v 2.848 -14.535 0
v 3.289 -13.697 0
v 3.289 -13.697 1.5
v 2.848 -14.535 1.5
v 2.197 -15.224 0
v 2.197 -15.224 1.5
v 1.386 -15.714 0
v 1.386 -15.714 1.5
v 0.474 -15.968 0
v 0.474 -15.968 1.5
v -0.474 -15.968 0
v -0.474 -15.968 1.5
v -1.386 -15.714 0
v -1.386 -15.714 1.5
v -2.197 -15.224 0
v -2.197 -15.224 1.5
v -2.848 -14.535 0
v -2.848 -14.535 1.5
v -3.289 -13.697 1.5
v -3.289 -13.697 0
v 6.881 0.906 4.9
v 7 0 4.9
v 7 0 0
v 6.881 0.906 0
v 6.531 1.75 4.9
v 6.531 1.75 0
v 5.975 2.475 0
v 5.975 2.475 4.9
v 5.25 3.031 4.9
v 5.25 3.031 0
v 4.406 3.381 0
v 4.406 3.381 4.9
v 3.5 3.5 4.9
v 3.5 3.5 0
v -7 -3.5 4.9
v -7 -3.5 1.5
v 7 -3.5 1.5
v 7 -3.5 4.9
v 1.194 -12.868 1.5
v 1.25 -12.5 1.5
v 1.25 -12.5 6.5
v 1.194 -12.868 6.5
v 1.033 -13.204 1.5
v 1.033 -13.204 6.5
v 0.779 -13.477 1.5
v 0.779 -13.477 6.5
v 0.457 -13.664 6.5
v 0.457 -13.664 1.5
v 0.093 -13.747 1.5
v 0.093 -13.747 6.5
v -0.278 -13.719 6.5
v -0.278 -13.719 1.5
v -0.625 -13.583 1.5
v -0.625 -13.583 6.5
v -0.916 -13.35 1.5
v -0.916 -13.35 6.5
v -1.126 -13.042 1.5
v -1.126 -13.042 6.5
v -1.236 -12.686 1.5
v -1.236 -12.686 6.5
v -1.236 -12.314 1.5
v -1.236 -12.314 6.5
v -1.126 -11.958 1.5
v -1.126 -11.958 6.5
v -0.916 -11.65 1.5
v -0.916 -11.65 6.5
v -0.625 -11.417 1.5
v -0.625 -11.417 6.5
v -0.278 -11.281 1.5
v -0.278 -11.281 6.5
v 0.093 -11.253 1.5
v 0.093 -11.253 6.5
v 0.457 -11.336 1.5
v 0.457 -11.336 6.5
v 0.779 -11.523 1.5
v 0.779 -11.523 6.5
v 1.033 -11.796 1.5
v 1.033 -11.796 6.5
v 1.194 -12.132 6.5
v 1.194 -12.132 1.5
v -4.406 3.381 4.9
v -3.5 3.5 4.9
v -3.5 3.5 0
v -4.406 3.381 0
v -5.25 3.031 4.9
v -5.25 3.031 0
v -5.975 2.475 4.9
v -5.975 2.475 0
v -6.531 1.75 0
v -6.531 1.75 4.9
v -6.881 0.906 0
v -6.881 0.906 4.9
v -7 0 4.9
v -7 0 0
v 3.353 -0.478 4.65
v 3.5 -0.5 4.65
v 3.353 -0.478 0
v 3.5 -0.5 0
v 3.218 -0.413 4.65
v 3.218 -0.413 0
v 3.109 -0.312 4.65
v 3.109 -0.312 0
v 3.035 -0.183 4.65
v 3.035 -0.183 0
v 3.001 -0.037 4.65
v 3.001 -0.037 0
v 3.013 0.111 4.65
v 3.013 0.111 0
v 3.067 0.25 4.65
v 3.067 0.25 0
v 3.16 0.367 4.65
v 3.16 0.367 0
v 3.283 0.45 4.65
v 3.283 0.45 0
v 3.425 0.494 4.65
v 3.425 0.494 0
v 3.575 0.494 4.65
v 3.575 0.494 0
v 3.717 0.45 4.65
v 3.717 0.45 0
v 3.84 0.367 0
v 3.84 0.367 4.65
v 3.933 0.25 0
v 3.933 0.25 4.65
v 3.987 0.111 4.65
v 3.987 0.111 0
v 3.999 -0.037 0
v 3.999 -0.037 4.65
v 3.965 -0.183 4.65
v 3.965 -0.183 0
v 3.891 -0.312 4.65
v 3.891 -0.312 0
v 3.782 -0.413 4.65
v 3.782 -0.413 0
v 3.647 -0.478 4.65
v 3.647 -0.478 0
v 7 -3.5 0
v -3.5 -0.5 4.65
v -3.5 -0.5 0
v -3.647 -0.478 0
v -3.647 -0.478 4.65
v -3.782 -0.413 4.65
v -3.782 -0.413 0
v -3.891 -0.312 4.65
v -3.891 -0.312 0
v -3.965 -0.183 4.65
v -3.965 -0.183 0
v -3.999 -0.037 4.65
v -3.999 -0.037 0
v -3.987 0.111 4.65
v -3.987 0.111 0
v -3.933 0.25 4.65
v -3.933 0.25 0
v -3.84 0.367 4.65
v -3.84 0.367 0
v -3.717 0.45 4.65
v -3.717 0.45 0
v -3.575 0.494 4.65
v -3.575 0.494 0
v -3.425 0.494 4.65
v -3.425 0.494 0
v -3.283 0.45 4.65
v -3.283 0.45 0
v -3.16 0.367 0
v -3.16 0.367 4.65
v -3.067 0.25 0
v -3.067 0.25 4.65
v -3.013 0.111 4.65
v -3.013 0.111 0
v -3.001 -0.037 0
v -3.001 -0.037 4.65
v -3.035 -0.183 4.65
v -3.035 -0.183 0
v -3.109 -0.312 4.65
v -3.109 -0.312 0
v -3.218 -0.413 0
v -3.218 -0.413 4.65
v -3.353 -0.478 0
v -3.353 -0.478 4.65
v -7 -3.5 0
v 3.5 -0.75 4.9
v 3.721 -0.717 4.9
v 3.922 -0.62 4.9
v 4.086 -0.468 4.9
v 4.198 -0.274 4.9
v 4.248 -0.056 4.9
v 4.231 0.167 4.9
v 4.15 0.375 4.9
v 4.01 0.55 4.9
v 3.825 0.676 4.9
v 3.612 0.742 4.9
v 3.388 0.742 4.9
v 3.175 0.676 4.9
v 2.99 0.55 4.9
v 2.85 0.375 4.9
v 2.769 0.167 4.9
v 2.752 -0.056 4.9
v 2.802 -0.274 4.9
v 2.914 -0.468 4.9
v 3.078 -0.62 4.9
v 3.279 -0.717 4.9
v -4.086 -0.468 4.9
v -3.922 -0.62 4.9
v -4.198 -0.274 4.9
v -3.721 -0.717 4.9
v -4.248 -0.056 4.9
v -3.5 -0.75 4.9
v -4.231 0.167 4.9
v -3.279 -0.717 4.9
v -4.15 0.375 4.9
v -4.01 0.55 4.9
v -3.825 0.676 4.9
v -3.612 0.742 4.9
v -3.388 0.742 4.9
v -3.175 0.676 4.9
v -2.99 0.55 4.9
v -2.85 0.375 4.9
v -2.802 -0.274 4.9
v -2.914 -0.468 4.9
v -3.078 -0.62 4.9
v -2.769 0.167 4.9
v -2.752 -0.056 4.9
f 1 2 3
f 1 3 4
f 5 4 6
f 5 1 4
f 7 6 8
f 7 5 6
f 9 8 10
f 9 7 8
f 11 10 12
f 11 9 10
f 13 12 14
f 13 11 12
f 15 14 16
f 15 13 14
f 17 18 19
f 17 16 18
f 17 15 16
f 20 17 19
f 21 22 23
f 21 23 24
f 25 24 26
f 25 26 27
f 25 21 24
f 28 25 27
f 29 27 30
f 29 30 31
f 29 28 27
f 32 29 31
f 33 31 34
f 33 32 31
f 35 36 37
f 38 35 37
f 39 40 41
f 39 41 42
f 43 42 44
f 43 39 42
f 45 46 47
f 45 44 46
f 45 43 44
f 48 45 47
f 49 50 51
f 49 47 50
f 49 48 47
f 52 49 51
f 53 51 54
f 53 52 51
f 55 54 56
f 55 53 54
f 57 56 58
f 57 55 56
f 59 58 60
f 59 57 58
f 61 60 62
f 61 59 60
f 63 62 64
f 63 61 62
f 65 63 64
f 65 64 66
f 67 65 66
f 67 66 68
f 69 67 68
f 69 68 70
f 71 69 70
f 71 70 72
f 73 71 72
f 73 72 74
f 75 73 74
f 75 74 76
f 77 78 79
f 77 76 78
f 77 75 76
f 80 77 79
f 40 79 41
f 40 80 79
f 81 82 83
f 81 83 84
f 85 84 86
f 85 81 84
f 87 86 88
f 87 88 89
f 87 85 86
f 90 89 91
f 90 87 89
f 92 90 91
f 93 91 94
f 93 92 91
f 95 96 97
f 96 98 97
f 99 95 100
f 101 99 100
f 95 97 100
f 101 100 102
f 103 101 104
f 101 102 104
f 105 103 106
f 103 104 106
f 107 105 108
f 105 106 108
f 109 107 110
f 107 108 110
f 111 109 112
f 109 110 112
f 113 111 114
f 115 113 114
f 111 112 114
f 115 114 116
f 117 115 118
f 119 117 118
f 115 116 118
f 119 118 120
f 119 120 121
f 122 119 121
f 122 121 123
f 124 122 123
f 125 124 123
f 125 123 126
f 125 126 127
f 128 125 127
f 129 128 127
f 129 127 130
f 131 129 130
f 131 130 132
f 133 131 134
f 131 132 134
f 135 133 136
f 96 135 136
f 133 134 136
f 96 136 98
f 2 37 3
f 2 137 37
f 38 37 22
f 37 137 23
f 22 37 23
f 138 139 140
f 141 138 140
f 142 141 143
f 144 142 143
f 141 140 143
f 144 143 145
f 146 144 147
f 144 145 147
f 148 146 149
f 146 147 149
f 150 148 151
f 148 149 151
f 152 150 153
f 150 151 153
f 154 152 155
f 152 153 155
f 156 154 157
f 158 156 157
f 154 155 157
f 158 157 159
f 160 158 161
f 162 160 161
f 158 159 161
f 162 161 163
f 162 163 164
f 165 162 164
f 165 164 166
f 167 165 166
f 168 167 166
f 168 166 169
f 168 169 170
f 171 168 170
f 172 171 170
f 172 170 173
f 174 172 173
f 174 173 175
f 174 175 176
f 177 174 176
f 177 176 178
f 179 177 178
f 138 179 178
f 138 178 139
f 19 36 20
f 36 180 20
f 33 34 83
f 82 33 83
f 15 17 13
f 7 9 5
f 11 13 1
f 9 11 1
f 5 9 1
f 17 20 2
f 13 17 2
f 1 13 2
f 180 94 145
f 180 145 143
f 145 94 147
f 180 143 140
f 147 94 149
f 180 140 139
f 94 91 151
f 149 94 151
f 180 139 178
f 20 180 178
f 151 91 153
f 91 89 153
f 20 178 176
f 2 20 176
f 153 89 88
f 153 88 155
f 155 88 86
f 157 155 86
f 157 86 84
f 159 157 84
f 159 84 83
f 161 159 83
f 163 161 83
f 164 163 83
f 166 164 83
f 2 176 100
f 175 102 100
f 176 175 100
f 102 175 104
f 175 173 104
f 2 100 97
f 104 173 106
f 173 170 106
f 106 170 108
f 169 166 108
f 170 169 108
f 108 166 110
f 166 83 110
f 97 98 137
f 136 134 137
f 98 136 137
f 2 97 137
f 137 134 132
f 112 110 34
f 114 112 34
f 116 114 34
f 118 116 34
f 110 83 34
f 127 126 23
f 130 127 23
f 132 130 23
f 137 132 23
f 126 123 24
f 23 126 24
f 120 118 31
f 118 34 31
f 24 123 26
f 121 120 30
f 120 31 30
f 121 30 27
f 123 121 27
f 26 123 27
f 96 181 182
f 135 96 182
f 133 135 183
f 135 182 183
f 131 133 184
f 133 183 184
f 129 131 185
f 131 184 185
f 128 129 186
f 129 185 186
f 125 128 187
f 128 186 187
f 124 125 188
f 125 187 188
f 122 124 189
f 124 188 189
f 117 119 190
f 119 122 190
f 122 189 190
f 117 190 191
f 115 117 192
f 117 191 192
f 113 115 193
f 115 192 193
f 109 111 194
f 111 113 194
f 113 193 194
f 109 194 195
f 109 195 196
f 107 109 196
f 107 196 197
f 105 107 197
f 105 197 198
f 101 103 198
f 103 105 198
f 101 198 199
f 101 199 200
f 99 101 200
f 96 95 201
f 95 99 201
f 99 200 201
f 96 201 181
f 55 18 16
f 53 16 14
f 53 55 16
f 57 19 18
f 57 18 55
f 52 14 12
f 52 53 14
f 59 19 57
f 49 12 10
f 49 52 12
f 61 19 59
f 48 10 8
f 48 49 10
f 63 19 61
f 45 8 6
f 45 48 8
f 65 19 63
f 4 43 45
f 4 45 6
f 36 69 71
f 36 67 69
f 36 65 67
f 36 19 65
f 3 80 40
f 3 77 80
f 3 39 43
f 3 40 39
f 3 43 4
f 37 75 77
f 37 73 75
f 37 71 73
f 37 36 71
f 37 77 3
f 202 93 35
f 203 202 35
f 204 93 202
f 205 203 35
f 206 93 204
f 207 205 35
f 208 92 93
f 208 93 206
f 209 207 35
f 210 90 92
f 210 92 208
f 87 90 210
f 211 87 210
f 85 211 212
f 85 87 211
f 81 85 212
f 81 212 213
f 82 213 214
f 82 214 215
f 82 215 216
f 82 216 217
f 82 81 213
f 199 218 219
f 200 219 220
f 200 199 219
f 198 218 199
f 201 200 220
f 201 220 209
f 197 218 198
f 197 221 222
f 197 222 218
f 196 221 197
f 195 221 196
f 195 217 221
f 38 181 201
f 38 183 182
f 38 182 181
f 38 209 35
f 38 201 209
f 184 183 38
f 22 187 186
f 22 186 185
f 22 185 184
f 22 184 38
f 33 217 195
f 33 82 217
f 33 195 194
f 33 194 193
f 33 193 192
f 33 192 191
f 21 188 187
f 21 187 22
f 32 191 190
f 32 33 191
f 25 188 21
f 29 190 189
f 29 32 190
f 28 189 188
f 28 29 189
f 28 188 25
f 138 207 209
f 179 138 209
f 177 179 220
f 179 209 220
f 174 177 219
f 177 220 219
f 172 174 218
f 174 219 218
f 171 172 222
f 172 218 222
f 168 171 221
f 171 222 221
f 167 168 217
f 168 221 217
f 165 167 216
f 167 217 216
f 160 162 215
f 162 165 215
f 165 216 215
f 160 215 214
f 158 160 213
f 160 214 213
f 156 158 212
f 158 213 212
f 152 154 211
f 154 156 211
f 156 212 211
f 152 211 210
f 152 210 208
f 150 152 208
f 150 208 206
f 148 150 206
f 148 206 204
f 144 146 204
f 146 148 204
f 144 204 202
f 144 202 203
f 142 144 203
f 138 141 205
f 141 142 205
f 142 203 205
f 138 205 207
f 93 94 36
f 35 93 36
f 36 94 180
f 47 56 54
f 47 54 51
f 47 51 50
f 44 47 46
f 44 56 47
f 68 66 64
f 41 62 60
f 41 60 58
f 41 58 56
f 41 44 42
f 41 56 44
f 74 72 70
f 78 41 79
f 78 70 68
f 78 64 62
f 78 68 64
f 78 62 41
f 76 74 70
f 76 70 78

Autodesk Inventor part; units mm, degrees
ref_plane "YZ Plane" through (0, 0, 0) normal (1, 0, 0) x (0, 1, 0)
ref_plane "XZ Plane" through (0, 0, 0) normal (0, 1, 0) x (-1, 0, 0)
ref_plane "XY Plane" through (0, 0, 0) normal (0, 0, 1) x (1, 0, 0)
sketch "Эскиз1" plane through (0, 0, 0) normal (0, 0, 1) x (1, 0, 0)
  line L0 (-7, -3.5) -> (7, -3.5) construction
  line L1 (7, -3.5) -> (7, 3.5)
  line L2 (7, 3.5) -> (-7, 3.5)
  line L3 (-7, 3.5) -> (-7, -3.5)
  line L4 (-7, -3.5) -> (7, 3.5) construction
  line L5 (7, -3.5) -> (-7, 3.5) construction
  line L6 (0, -3.5) -> (0, -12.5) construction
  line L7 (-7, -3.5) -> (-3.289, -13.697)
  line L8 (7, -3.5) -> (3.289, -13.697)
  arc A0 (-3.289, -13.697) -> (3.289, -13.697) centre (0, -12.5) ccw
  point P0 (0, 0)
  point P1 (0, 0)
  point P2 (0, 0)
  point P3 (0, 0)
  dimension "d0" = 14
  dimension "d1" = 7
  dimension "d4" = 9
  dimension "d5" = 3.5
extrude "Выдавливание1" add sketch "Эскиз1" along normal blind 1.5
sketch "Эскиз4" plane through (0, 0, 1.5) normal (0, 0, 1) x (1, 0, 0)
  line L0 (7, 3.5) -> (-7, 3.5) projected
  line L1 (7, -3.5) -> (7, 3.5) projected
  line L2 (-7, 3.5) -> (-7, -3.5) projected
  line L3 (-7, -3.5) -> (7, -3.5)
  point P0 (0, 0)
extrude "Выдавливание6" add sketch "Эскиз4" along normal blind 3.4
sketch "Эскиз2" plane through (0, 0, 1.5) normal (0, 0, 1) x (1, 0, 0)
  arc A0 (-3.289, -13.697) -> (3.289, -13.697) centre (0, -12.5) ccw construction
  circle A1 centre (0, -12.5) radius 1.25
  point P0 (0, 0)
  dimension "d8" = 2.5
extrude "Выдавливание9" add sketch "Эскиз2" along normal blind 5
fillet "Сопряжение1" radius 3.5 2 edges at (7, 3.5, 2.45) (-7, 3.5, 2.45)
sketch "Эскиз5" plane through (0, 0, 4.9) normal (0, 0, 1) x (1, 0, 0)
  circle A0 centre (0, -9.5) radius 1.5 construction
  line L0 (7, -3.5) -> (-7, -3.5) construction
  line L1 (0, -3.5) -> (0, 3.5) construction
  line L2 (-7, 3.5) -> (7, 3.5) construction
  circle A1 centre (3.5, 0) radius 0.5
  line L3 (3.5, 3.5) -> (3.5, 0) construction
  line L4 (3.5, 0) -> (0, 0) construction
  circle A2 centre (-3.5, 0) radius 0.5
  dimension "d34" = 1
hole "Отверстие1" at (-3.5, 0, 4.9) at (3.5, 0, 4.9) direction (0, 0, -1) diameter 1 end through all countersink diameter 1.5 countersink angle 90
properties part number "переходник"
